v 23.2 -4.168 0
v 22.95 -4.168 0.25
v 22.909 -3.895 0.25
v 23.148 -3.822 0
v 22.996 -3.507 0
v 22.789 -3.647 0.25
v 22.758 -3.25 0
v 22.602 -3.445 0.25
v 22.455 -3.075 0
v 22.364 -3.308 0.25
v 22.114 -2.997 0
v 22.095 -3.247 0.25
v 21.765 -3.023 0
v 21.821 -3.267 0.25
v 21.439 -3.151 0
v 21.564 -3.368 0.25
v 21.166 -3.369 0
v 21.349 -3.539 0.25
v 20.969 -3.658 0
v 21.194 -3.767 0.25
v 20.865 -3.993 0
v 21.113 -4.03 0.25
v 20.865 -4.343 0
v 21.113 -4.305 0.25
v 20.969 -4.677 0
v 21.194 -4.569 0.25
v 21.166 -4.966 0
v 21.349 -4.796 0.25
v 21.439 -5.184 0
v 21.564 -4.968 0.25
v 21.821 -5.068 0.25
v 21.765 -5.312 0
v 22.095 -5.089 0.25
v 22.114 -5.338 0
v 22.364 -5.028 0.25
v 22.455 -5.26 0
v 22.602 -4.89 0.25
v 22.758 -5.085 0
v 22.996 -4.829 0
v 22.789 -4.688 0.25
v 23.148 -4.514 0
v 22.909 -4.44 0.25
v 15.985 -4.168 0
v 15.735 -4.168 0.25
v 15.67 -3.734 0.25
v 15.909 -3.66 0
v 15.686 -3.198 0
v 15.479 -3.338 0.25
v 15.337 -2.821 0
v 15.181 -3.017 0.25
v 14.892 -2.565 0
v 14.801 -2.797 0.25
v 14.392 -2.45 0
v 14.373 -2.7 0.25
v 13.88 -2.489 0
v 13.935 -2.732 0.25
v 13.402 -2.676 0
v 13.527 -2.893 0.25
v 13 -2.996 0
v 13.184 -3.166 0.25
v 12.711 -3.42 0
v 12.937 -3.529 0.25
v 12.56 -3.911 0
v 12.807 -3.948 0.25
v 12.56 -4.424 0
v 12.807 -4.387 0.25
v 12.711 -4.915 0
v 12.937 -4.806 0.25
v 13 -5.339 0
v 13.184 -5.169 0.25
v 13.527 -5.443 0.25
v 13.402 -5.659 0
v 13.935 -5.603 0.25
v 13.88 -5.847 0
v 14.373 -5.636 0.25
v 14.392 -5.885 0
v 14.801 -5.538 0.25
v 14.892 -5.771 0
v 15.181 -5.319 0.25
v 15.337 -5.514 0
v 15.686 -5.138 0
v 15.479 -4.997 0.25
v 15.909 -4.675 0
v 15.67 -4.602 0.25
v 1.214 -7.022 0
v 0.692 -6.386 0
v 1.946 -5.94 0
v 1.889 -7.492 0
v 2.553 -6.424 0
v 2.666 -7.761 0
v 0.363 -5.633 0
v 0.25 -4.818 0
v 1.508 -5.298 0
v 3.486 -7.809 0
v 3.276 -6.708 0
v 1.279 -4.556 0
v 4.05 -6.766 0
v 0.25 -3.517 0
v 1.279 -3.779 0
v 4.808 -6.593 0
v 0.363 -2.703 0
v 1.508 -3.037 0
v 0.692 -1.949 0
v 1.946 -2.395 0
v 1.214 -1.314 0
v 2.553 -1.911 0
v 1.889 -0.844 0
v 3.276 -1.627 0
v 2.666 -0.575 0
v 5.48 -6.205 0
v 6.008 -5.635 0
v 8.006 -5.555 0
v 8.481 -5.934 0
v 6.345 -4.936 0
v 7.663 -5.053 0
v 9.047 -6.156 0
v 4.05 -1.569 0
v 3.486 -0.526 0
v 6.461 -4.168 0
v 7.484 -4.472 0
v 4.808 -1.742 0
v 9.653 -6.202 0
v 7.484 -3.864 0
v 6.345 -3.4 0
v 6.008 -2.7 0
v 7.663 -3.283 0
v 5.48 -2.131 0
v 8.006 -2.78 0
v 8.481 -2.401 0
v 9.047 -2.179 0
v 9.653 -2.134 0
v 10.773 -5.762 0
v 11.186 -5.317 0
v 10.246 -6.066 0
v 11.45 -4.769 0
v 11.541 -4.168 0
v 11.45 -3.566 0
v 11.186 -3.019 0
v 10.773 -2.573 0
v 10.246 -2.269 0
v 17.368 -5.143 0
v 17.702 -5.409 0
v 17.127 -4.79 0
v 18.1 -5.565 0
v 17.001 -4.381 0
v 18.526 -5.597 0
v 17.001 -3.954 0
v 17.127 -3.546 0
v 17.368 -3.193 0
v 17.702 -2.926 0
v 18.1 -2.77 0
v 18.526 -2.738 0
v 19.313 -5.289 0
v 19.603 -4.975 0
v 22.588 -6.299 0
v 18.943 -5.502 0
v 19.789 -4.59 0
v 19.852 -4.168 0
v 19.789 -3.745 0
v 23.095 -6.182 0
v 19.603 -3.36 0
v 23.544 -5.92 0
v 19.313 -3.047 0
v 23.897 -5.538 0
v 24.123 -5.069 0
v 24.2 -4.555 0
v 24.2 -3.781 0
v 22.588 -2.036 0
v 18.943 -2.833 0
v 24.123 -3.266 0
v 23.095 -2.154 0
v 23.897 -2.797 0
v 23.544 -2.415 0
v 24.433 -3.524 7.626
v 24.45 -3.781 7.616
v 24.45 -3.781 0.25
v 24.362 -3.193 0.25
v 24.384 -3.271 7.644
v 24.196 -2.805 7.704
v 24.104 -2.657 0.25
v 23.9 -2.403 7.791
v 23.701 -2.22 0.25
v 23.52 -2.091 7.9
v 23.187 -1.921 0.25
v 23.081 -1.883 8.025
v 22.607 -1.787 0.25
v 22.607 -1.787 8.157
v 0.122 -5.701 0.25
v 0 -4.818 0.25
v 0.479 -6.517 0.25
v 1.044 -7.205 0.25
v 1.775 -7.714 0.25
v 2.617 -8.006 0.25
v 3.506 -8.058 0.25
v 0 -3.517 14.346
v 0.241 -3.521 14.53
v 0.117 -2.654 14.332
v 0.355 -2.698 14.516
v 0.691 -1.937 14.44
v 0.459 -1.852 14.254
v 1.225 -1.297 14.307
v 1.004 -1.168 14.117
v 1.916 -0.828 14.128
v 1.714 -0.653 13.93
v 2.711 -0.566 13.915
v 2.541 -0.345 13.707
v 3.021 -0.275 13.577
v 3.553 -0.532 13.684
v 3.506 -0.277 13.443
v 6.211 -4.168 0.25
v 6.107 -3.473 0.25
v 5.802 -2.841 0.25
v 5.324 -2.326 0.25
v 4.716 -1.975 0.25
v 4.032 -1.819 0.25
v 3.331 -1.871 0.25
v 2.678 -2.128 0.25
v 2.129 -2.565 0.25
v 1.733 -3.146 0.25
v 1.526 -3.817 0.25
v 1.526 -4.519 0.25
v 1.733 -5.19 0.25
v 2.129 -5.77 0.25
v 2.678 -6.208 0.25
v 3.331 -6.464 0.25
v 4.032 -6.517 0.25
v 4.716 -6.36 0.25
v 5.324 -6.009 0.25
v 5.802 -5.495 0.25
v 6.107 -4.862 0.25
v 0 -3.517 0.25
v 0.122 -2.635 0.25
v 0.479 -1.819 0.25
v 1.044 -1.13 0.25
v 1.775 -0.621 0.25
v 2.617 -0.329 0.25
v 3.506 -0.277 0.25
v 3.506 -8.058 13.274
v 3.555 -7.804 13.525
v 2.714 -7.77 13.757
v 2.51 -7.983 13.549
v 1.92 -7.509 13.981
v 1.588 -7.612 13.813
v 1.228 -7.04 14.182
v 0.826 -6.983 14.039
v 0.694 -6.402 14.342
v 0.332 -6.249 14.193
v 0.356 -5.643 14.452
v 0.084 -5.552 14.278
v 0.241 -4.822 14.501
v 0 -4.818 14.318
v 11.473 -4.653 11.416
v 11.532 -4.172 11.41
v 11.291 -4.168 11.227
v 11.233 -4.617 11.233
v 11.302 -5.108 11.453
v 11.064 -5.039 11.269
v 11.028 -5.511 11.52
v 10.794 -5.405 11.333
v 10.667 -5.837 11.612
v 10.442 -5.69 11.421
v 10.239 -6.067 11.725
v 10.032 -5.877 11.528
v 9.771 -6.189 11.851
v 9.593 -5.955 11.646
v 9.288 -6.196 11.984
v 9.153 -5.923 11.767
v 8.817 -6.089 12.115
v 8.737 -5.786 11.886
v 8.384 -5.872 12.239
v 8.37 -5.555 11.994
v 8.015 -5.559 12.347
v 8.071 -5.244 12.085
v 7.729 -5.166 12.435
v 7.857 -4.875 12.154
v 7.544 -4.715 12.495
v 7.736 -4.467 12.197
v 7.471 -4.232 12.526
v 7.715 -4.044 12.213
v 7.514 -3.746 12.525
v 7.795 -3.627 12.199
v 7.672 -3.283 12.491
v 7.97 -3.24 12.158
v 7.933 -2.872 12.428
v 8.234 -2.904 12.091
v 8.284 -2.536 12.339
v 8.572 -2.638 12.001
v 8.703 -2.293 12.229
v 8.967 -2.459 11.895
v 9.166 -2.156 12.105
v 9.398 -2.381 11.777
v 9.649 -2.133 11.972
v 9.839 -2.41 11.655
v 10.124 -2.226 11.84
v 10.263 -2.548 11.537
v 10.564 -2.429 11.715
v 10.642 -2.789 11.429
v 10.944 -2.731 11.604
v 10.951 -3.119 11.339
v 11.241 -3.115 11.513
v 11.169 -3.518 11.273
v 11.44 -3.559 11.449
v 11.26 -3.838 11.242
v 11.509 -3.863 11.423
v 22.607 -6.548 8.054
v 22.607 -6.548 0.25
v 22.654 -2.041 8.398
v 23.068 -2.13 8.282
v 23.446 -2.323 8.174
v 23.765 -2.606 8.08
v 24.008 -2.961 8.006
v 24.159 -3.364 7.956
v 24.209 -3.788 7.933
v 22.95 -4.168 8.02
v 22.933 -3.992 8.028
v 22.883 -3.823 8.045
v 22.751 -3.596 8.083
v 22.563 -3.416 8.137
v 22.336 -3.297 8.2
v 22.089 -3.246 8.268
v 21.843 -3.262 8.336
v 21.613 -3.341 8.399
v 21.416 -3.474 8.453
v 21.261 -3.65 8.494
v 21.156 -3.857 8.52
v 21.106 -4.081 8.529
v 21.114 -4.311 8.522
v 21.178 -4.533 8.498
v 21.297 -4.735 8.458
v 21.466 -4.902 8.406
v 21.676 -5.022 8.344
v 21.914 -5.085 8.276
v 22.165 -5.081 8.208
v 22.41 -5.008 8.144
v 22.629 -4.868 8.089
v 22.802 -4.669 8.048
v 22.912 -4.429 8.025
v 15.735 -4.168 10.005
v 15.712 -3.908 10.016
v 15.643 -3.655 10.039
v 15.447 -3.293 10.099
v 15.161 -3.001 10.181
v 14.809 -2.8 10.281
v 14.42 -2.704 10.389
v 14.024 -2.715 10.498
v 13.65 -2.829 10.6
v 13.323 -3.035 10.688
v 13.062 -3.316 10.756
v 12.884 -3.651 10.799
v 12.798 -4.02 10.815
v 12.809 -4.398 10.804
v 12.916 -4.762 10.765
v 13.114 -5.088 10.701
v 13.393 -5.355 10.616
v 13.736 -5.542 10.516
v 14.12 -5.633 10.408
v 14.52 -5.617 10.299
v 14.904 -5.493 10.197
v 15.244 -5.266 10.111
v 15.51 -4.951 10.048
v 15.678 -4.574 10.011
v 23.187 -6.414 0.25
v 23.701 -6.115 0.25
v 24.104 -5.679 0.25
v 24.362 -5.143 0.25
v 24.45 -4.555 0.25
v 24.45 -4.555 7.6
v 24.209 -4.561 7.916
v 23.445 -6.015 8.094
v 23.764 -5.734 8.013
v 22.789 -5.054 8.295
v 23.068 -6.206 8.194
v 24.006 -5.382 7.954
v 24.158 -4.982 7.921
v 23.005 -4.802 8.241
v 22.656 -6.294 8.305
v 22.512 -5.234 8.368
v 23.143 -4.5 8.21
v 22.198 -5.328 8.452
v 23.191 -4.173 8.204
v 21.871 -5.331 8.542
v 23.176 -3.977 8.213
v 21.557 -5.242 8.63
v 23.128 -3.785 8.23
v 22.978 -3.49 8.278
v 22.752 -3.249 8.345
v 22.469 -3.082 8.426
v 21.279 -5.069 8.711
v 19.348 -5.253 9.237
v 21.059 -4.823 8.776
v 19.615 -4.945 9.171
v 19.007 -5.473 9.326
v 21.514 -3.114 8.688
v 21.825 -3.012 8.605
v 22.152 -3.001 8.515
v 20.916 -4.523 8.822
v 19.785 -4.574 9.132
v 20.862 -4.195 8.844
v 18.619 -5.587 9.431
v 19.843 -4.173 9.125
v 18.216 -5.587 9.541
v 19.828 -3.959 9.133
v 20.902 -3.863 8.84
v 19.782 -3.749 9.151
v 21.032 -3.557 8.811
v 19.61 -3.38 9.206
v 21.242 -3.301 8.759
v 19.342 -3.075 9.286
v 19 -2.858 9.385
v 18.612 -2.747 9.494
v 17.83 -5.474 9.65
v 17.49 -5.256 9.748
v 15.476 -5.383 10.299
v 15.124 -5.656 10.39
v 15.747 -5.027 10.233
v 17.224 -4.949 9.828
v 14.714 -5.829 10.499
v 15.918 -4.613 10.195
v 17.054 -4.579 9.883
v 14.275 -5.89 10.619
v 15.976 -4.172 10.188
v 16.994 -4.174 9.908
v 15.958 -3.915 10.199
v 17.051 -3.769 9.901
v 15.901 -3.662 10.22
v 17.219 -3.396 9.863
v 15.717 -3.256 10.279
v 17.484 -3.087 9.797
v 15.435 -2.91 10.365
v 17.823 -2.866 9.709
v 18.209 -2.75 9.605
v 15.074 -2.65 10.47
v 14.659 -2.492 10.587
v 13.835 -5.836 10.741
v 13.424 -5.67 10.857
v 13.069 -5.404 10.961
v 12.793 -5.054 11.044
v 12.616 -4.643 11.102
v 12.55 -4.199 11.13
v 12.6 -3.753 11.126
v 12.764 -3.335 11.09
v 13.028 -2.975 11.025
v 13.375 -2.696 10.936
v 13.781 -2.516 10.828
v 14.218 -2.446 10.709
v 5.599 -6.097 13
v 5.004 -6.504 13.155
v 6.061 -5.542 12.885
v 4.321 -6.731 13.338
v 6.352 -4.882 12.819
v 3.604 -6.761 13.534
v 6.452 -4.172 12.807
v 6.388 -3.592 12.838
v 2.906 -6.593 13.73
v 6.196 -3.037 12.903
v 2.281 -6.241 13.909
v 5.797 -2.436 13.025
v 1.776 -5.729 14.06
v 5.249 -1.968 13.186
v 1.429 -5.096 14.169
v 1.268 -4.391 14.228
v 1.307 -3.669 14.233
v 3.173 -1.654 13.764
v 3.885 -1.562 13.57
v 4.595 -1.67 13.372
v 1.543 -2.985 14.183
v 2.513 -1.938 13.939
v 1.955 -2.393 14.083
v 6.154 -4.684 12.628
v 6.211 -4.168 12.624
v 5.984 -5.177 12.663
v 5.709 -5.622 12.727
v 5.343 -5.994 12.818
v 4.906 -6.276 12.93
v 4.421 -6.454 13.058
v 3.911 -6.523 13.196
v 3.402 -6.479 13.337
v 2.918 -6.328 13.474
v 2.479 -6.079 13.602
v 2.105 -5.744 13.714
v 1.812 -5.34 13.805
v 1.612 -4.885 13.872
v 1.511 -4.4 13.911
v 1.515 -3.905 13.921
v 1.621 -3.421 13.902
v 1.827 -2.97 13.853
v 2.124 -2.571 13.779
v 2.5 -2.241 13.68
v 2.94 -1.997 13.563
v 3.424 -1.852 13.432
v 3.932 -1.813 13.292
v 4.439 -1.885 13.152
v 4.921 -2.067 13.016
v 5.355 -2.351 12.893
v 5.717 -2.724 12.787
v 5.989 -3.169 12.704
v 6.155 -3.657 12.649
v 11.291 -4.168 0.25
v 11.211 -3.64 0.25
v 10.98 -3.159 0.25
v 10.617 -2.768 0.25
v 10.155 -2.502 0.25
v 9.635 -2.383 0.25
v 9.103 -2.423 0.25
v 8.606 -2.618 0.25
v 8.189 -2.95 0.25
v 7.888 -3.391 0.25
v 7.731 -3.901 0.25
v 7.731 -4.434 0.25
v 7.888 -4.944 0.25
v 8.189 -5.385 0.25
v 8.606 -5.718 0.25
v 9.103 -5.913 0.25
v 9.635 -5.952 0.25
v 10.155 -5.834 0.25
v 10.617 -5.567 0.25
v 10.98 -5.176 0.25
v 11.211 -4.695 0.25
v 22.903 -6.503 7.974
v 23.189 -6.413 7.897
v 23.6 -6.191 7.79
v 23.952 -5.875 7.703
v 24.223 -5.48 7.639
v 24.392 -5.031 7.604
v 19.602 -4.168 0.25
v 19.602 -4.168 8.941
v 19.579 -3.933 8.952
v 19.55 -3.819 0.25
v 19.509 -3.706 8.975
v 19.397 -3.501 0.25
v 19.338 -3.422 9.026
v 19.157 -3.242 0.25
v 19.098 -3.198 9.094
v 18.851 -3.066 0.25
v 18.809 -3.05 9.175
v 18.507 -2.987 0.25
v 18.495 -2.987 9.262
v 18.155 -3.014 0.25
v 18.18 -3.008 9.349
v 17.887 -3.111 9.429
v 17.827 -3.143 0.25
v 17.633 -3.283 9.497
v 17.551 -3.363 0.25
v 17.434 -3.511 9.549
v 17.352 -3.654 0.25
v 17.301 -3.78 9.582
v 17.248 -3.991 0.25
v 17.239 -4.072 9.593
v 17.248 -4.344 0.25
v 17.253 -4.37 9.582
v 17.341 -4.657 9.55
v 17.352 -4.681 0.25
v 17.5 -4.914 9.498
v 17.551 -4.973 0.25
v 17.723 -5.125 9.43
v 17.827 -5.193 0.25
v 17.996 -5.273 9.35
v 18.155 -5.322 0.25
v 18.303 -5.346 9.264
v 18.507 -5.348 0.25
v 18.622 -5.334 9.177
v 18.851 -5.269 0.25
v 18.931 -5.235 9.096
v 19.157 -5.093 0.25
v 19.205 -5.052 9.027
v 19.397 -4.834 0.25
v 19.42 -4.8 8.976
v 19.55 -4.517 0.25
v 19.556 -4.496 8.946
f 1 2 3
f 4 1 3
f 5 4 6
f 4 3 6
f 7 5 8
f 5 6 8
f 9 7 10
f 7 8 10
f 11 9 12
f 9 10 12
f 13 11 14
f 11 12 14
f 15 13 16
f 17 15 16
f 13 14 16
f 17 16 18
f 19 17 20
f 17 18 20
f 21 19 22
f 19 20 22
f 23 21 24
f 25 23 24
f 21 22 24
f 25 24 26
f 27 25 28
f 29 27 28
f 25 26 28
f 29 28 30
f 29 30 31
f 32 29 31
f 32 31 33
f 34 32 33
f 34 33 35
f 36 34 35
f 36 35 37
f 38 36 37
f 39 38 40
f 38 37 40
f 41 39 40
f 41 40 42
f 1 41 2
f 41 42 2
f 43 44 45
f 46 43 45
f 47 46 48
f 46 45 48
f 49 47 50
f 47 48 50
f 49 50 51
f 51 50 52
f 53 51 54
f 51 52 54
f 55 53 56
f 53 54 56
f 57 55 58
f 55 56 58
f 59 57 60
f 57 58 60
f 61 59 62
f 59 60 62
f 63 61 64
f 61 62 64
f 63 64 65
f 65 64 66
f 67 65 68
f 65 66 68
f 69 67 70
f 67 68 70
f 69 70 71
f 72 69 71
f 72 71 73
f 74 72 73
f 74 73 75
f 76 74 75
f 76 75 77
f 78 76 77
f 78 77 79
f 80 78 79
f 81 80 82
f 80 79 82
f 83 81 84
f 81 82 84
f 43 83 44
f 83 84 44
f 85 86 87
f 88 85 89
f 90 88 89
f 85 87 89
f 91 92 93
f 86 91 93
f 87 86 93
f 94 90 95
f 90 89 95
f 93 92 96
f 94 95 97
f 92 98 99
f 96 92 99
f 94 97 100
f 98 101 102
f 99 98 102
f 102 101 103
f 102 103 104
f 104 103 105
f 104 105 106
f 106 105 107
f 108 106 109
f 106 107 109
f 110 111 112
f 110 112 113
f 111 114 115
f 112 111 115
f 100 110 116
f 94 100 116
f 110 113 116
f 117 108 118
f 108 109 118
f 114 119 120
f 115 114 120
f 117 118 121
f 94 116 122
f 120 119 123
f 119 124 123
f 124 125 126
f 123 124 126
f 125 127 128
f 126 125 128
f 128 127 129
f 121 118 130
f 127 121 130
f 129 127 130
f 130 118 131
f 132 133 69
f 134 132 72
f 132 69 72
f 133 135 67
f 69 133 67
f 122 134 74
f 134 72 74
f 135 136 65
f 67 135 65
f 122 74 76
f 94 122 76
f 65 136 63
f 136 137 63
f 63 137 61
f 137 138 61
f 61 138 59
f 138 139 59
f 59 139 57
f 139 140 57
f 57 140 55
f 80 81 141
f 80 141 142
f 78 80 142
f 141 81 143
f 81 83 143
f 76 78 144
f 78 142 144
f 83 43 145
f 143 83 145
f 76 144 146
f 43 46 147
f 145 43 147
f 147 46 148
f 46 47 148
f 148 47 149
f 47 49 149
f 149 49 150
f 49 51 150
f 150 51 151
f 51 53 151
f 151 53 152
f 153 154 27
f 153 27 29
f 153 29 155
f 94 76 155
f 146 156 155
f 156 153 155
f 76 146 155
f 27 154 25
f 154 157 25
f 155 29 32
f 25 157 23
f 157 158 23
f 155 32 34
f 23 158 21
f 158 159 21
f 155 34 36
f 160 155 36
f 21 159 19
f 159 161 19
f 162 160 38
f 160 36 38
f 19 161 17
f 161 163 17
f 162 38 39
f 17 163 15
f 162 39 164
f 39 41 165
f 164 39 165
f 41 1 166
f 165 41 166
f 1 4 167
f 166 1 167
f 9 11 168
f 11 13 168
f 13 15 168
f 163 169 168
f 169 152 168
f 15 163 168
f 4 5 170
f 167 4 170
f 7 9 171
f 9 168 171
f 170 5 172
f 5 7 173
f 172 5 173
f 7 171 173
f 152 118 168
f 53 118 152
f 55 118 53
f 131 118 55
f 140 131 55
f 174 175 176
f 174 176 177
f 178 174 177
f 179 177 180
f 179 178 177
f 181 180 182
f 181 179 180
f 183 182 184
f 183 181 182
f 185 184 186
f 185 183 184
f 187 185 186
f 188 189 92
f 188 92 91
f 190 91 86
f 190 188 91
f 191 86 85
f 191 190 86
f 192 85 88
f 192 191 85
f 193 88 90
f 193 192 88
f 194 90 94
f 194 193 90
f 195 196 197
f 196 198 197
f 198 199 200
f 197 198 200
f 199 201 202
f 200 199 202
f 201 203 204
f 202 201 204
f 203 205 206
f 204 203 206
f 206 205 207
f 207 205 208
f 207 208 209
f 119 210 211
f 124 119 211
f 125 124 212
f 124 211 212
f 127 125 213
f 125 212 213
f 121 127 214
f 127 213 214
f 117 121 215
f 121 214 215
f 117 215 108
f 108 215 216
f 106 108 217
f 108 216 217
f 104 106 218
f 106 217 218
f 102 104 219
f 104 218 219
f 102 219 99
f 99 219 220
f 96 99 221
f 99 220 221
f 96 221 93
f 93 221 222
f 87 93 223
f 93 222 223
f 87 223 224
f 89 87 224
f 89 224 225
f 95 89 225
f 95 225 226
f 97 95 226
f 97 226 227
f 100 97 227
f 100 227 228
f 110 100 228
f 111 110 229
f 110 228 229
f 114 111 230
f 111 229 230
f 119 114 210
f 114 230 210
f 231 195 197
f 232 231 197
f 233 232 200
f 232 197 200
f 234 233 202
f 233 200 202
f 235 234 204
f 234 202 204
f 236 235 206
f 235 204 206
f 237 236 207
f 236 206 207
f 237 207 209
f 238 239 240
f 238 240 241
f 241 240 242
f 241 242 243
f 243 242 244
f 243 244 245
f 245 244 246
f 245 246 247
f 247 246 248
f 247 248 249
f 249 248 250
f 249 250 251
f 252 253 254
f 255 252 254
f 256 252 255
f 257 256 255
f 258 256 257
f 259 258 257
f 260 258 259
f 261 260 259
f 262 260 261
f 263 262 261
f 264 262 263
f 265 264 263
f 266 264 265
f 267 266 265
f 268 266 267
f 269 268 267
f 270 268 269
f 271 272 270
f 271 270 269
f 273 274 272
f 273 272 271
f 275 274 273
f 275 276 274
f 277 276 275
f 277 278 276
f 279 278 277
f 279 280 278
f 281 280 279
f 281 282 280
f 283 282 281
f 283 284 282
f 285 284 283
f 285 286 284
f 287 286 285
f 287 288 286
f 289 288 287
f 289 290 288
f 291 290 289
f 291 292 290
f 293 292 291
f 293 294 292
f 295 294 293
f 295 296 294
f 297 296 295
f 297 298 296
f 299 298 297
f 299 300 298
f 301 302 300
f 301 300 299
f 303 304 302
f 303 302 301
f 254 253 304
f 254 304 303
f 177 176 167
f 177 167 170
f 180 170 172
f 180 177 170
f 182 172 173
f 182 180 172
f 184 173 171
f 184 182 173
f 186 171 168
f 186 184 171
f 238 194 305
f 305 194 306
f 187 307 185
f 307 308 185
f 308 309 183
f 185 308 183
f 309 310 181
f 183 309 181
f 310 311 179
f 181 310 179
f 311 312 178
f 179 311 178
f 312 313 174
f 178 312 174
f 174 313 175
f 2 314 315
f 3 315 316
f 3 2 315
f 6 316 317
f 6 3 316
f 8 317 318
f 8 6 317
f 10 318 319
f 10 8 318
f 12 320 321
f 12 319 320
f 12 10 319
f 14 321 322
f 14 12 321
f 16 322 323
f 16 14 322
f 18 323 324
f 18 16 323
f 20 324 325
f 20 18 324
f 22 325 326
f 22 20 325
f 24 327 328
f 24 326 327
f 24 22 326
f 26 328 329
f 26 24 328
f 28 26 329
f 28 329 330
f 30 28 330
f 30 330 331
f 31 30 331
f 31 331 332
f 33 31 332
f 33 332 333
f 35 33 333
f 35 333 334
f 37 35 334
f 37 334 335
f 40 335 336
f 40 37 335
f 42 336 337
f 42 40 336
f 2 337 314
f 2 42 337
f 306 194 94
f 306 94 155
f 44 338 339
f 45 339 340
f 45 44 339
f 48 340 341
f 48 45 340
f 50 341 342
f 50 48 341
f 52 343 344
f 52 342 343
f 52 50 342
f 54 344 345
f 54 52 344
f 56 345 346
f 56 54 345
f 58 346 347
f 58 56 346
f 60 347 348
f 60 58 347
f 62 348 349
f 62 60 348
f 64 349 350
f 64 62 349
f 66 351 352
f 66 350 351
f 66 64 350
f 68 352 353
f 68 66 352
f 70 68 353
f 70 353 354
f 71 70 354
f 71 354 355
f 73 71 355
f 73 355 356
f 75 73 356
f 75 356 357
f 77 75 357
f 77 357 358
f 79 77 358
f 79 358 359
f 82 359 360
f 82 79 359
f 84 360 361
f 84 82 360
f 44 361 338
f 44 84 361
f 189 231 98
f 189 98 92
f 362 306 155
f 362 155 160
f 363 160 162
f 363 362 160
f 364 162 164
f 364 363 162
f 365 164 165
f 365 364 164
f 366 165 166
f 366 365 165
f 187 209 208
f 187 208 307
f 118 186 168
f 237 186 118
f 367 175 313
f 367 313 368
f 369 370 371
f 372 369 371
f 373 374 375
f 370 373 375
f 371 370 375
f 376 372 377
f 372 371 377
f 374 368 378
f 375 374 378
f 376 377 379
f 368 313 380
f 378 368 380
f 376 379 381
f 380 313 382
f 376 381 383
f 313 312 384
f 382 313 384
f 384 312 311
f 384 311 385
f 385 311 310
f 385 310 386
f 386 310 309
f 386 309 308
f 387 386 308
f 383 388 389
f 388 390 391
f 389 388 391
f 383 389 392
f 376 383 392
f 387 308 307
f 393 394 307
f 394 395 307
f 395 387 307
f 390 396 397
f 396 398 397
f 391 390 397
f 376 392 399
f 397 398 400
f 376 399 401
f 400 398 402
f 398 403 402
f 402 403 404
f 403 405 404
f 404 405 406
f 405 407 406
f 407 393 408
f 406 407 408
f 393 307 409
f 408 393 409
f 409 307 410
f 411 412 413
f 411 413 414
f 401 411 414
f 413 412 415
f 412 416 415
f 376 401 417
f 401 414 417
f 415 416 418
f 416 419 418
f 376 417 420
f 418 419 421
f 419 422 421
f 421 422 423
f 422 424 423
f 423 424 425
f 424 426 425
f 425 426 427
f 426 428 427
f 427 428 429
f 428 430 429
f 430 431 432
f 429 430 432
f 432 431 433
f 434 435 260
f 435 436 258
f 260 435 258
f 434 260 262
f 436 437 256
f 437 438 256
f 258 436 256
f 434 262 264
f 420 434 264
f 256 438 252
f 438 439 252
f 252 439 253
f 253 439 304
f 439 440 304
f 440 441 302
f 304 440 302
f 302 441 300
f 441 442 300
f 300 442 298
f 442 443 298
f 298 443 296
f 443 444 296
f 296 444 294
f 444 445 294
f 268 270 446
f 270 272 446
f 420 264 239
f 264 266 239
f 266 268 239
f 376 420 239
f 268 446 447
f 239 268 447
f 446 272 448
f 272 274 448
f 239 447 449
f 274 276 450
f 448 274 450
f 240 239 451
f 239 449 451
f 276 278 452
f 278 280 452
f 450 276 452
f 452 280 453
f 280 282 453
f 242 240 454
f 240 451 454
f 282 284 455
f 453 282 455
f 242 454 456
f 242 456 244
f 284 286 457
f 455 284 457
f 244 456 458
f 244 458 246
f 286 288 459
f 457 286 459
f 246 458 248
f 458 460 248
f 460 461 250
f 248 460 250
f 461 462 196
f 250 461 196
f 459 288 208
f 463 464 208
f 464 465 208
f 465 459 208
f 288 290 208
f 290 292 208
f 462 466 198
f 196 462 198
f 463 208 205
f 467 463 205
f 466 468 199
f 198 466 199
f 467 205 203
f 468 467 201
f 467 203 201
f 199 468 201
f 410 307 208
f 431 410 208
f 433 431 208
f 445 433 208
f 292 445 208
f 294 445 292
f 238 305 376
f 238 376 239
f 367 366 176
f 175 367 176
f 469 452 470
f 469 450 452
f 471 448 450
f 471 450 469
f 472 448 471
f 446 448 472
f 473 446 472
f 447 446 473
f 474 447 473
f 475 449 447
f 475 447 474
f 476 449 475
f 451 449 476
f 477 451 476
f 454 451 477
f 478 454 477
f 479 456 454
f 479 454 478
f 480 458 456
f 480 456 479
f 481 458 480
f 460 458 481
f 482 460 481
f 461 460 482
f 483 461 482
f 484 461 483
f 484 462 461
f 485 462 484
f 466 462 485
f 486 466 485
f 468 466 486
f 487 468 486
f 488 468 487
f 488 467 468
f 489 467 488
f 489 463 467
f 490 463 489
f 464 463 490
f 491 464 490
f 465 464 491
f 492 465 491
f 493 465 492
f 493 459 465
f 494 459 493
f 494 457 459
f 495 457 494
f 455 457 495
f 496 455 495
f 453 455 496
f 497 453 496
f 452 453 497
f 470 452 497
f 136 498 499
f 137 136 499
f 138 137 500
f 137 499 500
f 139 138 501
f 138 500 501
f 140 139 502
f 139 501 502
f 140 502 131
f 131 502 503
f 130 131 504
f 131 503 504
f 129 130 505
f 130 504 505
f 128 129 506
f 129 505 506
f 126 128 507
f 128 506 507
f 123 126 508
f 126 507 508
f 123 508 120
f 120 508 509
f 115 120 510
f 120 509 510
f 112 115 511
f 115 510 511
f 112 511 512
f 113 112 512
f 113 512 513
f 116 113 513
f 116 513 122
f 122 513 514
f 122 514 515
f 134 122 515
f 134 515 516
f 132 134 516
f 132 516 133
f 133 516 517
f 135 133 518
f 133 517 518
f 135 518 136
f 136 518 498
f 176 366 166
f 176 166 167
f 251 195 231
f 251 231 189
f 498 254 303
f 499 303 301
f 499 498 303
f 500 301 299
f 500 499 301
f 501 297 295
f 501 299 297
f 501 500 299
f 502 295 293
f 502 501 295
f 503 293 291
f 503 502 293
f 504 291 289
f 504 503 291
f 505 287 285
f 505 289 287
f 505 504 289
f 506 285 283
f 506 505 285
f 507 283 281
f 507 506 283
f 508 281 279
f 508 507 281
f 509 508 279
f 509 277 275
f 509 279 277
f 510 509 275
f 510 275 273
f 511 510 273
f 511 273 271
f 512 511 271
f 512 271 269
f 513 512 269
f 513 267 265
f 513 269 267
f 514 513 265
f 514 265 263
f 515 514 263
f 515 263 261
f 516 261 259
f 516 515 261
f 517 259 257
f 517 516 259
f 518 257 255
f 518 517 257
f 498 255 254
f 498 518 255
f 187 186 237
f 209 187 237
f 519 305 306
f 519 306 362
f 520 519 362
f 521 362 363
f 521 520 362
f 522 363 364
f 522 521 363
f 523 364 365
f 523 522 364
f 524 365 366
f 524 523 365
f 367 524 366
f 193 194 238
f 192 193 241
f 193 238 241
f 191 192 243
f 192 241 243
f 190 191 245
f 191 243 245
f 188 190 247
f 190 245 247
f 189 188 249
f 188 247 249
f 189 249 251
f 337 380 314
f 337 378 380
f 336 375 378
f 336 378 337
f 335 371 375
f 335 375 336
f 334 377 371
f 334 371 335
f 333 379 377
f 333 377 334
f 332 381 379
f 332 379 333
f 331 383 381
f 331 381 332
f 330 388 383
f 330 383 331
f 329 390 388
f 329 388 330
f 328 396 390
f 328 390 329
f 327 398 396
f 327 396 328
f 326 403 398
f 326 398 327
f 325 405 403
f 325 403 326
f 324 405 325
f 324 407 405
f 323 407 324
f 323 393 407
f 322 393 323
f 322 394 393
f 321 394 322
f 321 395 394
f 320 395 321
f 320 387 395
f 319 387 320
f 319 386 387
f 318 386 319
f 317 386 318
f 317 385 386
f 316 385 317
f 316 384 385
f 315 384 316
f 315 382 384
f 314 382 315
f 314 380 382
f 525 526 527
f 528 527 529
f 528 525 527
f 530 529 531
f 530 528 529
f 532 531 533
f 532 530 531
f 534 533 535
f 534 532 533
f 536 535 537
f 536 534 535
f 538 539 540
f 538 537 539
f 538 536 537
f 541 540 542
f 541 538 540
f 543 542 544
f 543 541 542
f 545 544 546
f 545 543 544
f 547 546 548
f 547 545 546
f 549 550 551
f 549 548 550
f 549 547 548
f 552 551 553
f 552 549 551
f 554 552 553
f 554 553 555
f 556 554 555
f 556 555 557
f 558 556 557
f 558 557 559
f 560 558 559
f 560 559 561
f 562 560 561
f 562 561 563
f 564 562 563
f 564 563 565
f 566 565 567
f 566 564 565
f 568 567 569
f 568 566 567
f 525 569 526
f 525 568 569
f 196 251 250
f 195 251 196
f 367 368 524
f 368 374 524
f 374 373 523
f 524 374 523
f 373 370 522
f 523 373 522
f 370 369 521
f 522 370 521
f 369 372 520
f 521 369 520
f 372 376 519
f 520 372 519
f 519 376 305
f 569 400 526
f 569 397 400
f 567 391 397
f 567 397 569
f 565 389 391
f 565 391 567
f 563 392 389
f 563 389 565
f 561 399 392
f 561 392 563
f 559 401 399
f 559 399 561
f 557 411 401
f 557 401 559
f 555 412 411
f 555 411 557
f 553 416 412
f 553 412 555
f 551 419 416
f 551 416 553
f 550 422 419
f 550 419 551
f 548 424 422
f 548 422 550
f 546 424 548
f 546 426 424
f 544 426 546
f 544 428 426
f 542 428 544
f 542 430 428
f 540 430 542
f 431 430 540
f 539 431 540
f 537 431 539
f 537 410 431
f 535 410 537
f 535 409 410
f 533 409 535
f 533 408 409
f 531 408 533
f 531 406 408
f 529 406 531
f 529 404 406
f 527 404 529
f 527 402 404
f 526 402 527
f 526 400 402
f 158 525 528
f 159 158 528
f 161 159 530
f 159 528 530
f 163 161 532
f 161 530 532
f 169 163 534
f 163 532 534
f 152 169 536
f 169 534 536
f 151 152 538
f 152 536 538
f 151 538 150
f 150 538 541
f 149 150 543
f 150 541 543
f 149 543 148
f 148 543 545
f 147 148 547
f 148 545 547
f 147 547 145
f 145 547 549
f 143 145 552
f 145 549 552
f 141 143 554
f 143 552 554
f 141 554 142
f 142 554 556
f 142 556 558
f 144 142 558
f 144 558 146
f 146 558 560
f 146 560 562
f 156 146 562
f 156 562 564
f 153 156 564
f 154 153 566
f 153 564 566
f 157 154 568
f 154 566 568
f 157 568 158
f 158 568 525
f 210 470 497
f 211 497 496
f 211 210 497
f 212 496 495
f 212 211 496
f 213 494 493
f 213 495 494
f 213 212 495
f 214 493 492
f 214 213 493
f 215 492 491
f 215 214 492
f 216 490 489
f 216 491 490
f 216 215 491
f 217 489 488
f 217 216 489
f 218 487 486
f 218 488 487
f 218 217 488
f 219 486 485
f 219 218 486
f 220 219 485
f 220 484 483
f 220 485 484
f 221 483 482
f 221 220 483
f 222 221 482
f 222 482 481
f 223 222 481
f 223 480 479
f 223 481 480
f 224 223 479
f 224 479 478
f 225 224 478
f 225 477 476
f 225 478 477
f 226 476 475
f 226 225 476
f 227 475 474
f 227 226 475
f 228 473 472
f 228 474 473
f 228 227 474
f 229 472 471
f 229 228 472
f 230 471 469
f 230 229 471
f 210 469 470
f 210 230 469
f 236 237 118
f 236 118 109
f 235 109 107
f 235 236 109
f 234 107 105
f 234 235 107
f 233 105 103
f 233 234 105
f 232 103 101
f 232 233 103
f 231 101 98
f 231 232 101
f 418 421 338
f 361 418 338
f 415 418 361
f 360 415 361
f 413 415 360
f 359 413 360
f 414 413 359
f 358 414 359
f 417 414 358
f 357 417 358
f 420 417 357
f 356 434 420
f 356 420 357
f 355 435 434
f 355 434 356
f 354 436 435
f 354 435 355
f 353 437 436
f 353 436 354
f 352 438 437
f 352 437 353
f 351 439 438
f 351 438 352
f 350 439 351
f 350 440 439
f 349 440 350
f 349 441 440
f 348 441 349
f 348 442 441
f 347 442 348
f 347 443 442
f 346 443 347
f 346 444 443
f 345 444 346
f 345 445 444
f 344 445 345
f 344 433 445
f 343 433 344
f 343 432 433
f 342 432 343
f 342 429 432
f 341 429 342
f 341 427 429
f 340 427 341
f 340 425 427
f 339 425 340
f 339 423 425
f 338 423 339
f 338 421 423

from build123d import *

# Parameters (mm, degrees)
SKETCH001_R       = 2.355589
SKETCH001_R_2     = 1.789786
SKETCH001_R_3     = 1.472243
SKETCH001_R_4     = 1.183568
SKETCH001_R_5     = 0.92376
PAD_DEPTH         = 15
POCKET_DEPTH      = 8.310486
POCKET_DEPTH_BACK = 1.927638
FILLET_R          = 2
FILLET001_R       = 3.25
CHAMFER_SIZE      = 0.25


with BuildPart() as part:
    # Sketch001 → Pad (new body)
    with BuildSketch(Plane.XY):
        Polygon((0, -8.335405), (24.449893, -6.402758), (24.449893, -1.932647), (0, 0), align=None)
        with Locations((3.855589, -4.167703)):
            Circle(SKETCH001_R, mode=Mode.SUBTRACT)
        with Locations((9.500964, -4.167703)):
            Circle(SKETCH001_R_2, mode=Mode.SUBTRACT)
        with Locations((14.262993, -4.167703)):
            Circle(SKETCH001_R_3, mode=Mode.SUBTRACT)
        with Locations((18.418804, -4.167703)):
            Circle(SKETCH001_R_4, mode=Mode.SUBTRACT)
        with Locations((22.026133, -4.167703)):
            Circle(SKETCH001_R_5, mode=Mode.SUBTRACT)
    extrude(amount=PAD_DEPTH)

    # Sketch002 (on DatumPlane) → Pocket (cut, two sides)
    with BuildSketch(Plane(origin=(0, 0, 0), x_dir=(-0.99689, 0.078799, 0), z_dir=(0.078799, 0.99689, 0))) as pocket_sk:
        Polygon((-26, 15.5), (-26, 7.5), (3, 15.5), align=None)
    extrude(amount=-POCKET_DEPTH, mode=Mode.SUBTRACT)
    extrude(pocket_sk.sketch, amount=POCKET_DEPTH_BACK, mode=Mode.SUBTRACT)

    # Fillet
    fillet_edges = [part.edges().sort_by_distance(p)[0] for p in [
        (24.449893, -6.402758, 3.904703),
        (24.449893, -1.932647, 3.953289),
    ]]
    fillet(fillet_edges, radius=FILLET_R)

    # Fillet001
    fillet001_edges = [part.edges().sort_by_distance(p)[0] for p in [
        (0, -8.335405, 7.24561),
        (0, 0, 7.336207),
    ]]
    fillet(fillet001_edges, radius=FILLET001_R)

    # Chamfer
    chamfer_edges = [part.edges().sort_by_distance(p)[0] for p in [
        (13.056795, -1.032077, 0),
        (13.056795, -1.032077, 11.059304),
        (12.79075, -4.167702, 11.064306),
        (7.711178, -4.167701, 12.46121),
        (17.235236, -4.167702, 9.842054),
        (1.5, -4.167701, 14.169311),
        (21.102372, -4.167702, 8.778575),
        (21.102372, -4.167703, 0),
        (17.235236, -4.167703, 0),
        (12.79075, -4.167703, 0),
        (7.711178, -4.167703, 0),
        (1.5, -4.167703, 0),
    ]]
    chamfer(chamfer_edges, length=CHAMFER_SIZE)


solid = part.part
